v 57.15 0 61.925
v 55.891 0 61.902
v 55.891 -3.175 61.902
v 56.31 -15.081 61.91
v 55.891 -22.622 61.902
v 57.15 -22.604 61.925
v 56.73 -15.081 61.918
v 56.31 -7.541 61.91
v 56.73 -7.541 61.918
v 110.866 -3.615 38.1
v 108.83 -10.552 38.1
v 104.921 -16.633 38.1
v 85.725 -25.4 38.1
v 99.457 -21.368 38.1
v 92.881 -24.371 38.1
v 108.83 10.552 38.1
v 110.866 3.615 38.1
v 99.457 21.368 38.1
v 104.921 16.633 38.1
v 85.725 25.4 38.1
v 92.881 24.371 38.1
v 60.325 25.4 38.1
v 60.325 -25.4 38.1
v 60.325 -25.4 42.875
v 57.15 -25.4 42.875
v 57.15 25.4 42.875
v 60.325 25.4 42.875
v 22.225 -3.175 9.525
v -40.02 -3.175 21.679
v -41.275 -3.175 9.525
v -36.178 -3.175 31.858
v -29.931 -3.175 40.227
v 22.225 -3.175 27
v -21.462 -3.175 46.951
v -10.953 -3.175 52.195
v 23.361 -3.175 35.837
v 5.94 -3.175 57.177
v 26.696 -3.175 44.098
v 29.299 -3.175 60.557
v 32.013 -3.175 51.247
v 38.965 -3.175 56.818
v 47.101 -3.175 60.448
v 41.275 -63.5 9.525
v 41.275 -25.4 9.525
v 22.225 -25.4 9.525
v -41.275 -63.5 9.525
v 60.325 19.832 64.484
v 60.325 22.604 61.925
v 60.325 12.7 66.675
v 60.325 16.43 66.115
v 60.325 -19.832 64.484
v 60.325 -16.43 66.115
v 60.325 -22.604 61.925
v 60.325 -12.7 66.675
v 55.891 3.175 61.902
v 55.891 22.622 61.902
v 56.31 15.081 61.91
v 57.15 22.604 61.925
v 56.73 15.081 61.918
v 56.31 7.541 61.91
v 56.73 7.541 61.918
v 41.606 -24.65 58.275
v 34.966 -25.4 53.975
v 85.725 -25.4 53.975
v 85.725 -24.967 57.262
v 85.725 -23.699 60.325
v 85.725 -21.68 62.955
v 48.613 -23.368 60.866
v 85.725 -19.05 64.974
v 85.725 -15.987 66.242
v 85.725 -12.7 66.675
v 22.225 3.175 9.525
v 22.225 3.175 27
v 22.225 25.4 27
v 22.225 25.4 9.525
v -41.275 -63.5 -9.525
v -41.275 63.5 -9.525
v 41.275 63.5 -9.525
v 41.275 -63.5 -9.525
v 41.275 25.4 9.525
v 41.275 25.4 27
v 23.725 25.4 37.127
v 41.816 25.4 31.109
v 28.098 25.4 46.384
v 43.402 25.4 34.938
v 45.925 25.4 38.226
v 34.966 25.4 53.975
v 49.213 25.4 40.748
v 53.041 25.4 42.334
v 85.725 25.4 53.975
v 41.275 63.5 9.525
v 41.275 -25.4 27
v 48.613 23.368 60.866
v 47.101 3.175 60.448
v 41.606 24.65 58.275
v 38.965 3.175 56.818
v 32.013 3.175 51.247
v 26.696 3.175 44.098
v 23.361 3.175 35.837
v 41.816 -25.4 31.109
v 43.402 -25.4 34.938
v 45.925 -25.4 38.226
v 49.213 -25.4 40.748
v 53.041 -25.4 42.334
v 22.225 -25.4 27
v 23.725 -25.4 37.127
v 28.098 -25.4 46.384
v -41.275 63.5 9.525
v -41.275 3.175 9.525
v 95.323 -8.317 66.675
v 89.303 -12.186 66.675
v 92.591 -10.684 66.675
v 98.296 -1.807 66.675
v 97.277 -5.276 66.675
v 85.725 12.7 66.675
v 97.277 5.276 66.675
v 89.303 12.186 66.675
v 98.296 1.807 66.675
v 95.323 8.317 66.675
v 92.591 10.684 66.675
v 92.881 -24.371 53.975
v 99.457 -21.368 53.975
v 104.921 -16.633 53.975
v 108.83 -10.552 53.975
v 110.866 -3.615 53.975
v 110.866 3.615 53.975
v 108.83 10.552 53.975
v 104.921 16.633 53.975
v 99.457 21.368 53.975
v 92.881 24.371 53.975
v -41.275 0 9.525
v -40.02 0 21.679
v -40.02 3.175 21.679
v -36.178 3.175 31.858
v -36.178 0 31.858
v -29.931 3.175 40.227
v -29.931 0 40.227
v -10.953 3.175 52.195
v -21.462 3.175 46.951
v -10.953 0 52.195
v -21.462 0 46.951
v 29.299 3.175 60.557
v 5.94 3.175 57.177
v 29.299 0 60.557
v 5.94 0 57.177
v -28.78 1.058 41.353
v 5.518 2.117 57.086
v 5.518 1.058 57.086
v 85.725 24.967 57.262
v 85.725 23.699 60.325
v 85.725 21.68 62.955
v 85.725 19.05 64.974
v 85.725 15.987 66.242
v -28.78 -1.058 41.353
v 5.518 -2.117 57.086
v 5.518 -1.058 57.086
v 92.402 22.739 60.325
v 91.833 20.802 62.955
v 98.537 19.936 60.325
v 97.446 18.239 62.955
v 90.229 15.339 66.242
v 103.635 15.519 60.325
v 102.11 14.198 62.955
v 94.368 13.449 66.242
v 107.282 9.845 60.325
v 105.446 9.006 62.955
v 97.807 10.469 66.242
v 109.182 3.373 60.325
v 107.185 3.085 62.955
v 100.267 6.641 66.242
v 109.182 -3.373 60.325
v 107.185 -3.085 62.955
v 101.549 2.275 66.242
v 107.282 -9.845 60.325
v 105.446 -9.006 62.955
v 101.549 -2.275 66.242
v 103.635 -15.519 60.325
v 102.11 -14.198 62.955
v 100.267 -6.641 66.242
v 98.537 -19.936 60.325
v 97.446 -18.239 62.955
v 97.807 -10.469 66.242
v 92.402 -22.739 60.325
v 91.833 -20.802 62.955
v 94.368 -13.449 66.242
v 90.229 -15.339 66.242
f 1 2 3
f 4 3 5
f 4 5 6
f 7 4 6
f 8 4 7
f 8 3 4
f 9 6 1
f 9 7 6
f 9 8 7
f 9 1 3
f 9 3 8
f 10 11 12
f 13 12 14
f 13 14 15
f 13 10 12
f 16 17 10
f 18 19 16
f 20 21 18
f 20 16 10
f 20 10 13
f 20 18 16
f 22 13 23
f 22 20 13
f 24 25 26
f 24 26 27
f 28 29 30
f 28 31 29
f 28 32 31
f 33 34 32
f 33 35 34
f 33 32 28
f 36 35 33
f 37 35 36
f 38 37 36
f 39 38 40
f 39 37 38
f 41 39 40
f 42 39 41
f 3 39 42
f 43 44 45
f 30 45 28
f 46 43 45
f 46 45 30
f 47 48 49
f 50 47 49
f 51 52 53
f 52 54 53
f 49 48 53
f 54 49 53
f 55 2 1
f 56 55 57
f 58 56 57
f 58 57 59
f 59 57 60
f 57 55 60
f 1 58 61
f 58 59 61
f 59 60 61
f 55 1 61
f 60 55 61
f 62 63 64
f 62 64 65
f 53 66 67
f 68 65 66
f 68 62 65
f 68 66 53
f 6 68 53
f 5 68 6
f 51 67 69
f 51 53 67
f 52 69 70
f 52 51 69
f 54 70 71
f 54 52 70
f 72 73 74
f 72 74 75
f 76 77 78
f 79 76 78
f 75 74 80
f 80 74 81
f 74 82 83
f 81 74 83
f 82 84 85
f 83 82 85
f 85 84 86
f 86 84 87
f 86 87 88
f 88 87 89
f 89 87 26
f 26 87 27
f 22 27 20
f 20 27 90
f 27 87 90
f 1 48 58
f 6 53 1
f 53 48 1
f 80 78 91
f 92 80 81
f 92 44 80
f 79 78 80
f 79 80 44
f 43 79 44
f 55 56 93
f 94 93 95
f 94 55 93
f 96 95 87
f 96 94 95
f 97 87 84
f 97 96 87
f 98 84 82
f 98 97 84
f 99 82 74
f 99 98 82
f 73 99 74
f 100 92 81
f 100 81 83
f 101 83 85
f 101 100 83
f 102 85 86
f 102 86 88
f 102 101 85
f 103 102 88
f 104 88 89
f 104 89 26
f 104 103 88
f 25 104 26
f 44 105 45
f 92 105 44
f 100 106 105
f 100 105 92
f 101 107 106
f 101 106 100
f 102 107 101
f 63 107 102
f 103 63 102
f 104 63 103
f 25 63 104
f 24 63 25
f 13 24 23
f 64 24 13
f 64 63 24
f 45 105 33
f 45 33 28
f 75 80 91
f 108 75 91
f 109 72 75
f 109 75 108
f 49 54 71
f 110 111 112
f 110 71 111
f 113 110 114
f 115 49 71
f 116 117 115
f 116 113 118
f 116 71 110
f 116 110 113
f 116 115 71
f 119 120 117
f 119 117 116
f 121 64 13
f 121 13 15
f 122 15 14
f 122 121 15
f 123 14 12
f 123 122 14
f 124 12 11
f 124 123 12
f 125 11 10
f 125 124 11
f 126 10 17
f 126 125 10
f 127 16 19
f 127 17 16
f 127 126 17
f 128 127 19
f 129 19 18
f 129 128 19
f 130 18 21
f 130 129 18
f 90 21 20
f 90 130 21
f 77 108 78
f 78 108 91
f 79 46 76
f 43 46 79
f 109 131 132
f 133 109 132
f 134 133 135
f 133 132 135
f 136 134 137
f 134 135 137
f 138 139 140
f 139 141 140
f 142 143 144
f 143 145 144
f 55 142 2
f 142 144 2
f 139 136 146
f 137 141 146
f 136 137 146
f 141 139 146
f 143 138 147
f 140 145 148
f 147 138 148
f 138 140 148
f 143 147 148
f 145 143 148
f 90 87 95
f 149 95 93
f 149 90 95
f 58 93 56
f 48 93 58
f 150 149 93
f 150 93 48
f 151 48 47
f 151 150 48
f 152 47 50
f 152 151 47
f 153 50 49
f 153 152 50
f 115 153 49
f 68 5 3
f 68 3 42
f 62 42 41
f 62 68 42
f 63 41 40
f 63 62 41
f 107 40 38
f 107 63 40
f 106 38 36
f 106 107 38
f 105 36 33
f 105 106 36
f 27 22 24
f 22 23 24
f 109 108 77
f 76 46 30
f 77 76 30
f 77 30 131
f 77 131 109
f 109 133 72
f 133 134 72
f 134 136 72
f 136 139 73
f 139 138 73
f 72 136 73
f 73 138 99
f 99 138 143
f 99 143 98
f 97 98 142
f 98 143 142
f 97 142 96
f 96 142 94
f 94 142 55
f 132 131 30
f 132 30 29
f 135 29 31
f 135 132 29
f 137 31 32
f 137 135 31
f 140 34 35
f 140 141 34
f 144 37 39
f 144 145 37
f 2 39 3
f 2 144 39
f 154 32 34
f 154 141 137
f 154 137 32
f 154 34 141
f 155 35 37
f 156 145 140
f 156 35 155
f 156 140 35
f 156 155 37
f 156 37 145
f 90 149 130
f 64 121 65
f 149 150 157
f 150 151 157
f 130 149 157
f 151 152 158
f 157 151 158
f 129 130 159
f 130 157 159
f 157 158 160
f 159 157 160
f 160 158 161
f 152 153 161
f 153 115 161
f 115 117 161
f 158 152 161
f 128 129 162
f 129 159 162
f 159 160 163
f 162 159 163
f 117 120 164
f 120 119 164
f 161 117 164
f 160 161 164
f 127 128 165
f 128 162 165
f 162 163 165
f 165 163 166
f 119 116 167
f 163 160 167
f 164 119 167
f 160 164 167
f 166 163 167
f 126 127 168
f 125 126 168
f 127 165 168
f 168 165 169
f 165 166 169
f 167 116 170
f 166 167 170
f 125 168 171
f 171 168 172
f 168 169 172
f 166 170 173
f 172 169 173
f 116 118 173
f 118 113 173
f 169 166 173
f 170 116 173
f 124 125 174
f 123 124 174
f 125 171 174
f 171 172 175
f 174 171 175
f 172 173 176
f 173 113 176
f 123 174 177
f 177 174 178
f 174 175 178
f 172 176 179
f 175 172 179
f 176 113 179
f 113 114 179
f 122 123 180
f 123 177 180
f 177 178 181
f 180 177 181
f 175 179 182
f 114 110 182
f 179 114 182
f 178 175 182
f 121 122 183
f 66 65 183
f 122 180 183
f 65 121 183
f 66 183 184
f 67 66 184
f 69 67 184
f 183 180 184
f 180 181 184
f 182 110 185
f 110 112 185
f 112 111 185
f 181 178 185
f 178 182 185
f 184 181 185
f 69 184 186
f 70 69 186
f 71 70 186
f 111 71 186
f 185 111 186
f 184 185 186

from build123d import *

# Parameters (mm, degrees)
F1_DEPTH = 63.5
F0_W     = 25.4
F0_H     = 19.05
F0_H_2   = 4.7498
F0_H_3   = 4.7752
F2_DEPTH = 25.4
F4_DEPTH = 3.175
F5_R     = 12.7


with BuildPart() as f1:
    # F0 (on Front) → F1 (new body, symmetric)
    with BuildSketch(Plane.XZ):
        Polygon((41.275, -9.525), (41.275, 9.525), (22.225, 9.525), (-41.275, 9.525), (-41.275, -9.525), align=None)
    extrude(amount=F1_DEPTH, both=True)

    # F0 (on Front) → F2 (join, symmetric)
    with BuildSketch(Plane.XZ):
        with BuildLine():
            Line((22.225, 9.525), (41.275, 9.525))
            Line((41.275, 9.525), (41.275, 27.0002))
            ThreePointArc((41.275, 27.0002), (45.9246798487, 38.2255201513), (57.15, 42.8752))
            Line((57.15, 42.8752), (60.325, 42.8752))
            Line((60.325, 42.8752), (60.325, 61.9252))
            Line((60.325, 61.9252), (57.15, 61.9252))
            add(Edge.make_bspline(
                [(55.8906627655, 61.9024878151), (56.3095920905, 61.9105285601), (56.7293746708, 61.9180961221), (57.15, 61.9252)],
                knots=[110.683860184, 110.683860184, 110.683860184, 110.683860184, 111.5045361635, 111.5045361635, 111.5045361635, 111.5045361635], degree=3))
            ThreePointArc((55.8906627655, 61.9024878151), (32.0129956248, 51.2465736679), (22.225, 27.0002))
            Line((22.225, 27.0002), (22.225, 9.525))
        make_face()
        with Locations((73.025, 52.4002)):
            Rectangle(F0_W, F0_H)
        with Locations((73.025, 64.3001)):
            Rectangle(F0_W, F0_H_2)
        with Locations((73.025, 40.4876)):
            Rectangle(F0_W, F0_H_3)
    extrude(amount=F2_DEPTH, both=True)

    # F0 (on Front) → F3 (revolve)
    with BuildSketch(Plane.XZ):
        Polygon((85.725, 61.9252), (85.725, 42.8752), (85.725, 38.1), (111.125, 38.1), (111.125, 66.675), (85.725, 66.675), align=None)
    revolve(axis=Axis((85.725, 0, 52.3875), (0, 0, 1)))

    # F0 (on Front) → F4 (join, symmetric)
    with BuildSketch(Plane.XZ):
        with BuildLine():
            Line((-41.275, 9.525), (22.225, 9.525))
            Line((22.225, 9.525), (22.225, 27.0002))
            ThreePointArc((22.225, 27.0002), (32.0129956248, 51.2465736679), (55.8906627655, 61.9024878151))
            add(Edge.make_bspline(
                [(-41.275, 9.525), (-41.5901642884, 51.126542611), (-0.6099732885, 60.8180394914), (55.8906627655, 61.9024878151)],
                knots=[0, 0, 0, 0, 110.683860184, 110.683860184, 110.683860184, 110.683860184], degree=3))
        make_face()
    extrude(amount=F4_DEPTH, both=True)

    # F5
    f5_edges = [f1.edges().sort_by_distance(p)[0] for p in [
        (85.725, 25.4, 52.3875),
        (73.025, 25.4, 66.675),
        (73.025, -25.4, 66.675),
        (111.125, 0, 66.675),
    ]]
    fillet(f5_edges, radius=F5_R)


solid = f1.part
